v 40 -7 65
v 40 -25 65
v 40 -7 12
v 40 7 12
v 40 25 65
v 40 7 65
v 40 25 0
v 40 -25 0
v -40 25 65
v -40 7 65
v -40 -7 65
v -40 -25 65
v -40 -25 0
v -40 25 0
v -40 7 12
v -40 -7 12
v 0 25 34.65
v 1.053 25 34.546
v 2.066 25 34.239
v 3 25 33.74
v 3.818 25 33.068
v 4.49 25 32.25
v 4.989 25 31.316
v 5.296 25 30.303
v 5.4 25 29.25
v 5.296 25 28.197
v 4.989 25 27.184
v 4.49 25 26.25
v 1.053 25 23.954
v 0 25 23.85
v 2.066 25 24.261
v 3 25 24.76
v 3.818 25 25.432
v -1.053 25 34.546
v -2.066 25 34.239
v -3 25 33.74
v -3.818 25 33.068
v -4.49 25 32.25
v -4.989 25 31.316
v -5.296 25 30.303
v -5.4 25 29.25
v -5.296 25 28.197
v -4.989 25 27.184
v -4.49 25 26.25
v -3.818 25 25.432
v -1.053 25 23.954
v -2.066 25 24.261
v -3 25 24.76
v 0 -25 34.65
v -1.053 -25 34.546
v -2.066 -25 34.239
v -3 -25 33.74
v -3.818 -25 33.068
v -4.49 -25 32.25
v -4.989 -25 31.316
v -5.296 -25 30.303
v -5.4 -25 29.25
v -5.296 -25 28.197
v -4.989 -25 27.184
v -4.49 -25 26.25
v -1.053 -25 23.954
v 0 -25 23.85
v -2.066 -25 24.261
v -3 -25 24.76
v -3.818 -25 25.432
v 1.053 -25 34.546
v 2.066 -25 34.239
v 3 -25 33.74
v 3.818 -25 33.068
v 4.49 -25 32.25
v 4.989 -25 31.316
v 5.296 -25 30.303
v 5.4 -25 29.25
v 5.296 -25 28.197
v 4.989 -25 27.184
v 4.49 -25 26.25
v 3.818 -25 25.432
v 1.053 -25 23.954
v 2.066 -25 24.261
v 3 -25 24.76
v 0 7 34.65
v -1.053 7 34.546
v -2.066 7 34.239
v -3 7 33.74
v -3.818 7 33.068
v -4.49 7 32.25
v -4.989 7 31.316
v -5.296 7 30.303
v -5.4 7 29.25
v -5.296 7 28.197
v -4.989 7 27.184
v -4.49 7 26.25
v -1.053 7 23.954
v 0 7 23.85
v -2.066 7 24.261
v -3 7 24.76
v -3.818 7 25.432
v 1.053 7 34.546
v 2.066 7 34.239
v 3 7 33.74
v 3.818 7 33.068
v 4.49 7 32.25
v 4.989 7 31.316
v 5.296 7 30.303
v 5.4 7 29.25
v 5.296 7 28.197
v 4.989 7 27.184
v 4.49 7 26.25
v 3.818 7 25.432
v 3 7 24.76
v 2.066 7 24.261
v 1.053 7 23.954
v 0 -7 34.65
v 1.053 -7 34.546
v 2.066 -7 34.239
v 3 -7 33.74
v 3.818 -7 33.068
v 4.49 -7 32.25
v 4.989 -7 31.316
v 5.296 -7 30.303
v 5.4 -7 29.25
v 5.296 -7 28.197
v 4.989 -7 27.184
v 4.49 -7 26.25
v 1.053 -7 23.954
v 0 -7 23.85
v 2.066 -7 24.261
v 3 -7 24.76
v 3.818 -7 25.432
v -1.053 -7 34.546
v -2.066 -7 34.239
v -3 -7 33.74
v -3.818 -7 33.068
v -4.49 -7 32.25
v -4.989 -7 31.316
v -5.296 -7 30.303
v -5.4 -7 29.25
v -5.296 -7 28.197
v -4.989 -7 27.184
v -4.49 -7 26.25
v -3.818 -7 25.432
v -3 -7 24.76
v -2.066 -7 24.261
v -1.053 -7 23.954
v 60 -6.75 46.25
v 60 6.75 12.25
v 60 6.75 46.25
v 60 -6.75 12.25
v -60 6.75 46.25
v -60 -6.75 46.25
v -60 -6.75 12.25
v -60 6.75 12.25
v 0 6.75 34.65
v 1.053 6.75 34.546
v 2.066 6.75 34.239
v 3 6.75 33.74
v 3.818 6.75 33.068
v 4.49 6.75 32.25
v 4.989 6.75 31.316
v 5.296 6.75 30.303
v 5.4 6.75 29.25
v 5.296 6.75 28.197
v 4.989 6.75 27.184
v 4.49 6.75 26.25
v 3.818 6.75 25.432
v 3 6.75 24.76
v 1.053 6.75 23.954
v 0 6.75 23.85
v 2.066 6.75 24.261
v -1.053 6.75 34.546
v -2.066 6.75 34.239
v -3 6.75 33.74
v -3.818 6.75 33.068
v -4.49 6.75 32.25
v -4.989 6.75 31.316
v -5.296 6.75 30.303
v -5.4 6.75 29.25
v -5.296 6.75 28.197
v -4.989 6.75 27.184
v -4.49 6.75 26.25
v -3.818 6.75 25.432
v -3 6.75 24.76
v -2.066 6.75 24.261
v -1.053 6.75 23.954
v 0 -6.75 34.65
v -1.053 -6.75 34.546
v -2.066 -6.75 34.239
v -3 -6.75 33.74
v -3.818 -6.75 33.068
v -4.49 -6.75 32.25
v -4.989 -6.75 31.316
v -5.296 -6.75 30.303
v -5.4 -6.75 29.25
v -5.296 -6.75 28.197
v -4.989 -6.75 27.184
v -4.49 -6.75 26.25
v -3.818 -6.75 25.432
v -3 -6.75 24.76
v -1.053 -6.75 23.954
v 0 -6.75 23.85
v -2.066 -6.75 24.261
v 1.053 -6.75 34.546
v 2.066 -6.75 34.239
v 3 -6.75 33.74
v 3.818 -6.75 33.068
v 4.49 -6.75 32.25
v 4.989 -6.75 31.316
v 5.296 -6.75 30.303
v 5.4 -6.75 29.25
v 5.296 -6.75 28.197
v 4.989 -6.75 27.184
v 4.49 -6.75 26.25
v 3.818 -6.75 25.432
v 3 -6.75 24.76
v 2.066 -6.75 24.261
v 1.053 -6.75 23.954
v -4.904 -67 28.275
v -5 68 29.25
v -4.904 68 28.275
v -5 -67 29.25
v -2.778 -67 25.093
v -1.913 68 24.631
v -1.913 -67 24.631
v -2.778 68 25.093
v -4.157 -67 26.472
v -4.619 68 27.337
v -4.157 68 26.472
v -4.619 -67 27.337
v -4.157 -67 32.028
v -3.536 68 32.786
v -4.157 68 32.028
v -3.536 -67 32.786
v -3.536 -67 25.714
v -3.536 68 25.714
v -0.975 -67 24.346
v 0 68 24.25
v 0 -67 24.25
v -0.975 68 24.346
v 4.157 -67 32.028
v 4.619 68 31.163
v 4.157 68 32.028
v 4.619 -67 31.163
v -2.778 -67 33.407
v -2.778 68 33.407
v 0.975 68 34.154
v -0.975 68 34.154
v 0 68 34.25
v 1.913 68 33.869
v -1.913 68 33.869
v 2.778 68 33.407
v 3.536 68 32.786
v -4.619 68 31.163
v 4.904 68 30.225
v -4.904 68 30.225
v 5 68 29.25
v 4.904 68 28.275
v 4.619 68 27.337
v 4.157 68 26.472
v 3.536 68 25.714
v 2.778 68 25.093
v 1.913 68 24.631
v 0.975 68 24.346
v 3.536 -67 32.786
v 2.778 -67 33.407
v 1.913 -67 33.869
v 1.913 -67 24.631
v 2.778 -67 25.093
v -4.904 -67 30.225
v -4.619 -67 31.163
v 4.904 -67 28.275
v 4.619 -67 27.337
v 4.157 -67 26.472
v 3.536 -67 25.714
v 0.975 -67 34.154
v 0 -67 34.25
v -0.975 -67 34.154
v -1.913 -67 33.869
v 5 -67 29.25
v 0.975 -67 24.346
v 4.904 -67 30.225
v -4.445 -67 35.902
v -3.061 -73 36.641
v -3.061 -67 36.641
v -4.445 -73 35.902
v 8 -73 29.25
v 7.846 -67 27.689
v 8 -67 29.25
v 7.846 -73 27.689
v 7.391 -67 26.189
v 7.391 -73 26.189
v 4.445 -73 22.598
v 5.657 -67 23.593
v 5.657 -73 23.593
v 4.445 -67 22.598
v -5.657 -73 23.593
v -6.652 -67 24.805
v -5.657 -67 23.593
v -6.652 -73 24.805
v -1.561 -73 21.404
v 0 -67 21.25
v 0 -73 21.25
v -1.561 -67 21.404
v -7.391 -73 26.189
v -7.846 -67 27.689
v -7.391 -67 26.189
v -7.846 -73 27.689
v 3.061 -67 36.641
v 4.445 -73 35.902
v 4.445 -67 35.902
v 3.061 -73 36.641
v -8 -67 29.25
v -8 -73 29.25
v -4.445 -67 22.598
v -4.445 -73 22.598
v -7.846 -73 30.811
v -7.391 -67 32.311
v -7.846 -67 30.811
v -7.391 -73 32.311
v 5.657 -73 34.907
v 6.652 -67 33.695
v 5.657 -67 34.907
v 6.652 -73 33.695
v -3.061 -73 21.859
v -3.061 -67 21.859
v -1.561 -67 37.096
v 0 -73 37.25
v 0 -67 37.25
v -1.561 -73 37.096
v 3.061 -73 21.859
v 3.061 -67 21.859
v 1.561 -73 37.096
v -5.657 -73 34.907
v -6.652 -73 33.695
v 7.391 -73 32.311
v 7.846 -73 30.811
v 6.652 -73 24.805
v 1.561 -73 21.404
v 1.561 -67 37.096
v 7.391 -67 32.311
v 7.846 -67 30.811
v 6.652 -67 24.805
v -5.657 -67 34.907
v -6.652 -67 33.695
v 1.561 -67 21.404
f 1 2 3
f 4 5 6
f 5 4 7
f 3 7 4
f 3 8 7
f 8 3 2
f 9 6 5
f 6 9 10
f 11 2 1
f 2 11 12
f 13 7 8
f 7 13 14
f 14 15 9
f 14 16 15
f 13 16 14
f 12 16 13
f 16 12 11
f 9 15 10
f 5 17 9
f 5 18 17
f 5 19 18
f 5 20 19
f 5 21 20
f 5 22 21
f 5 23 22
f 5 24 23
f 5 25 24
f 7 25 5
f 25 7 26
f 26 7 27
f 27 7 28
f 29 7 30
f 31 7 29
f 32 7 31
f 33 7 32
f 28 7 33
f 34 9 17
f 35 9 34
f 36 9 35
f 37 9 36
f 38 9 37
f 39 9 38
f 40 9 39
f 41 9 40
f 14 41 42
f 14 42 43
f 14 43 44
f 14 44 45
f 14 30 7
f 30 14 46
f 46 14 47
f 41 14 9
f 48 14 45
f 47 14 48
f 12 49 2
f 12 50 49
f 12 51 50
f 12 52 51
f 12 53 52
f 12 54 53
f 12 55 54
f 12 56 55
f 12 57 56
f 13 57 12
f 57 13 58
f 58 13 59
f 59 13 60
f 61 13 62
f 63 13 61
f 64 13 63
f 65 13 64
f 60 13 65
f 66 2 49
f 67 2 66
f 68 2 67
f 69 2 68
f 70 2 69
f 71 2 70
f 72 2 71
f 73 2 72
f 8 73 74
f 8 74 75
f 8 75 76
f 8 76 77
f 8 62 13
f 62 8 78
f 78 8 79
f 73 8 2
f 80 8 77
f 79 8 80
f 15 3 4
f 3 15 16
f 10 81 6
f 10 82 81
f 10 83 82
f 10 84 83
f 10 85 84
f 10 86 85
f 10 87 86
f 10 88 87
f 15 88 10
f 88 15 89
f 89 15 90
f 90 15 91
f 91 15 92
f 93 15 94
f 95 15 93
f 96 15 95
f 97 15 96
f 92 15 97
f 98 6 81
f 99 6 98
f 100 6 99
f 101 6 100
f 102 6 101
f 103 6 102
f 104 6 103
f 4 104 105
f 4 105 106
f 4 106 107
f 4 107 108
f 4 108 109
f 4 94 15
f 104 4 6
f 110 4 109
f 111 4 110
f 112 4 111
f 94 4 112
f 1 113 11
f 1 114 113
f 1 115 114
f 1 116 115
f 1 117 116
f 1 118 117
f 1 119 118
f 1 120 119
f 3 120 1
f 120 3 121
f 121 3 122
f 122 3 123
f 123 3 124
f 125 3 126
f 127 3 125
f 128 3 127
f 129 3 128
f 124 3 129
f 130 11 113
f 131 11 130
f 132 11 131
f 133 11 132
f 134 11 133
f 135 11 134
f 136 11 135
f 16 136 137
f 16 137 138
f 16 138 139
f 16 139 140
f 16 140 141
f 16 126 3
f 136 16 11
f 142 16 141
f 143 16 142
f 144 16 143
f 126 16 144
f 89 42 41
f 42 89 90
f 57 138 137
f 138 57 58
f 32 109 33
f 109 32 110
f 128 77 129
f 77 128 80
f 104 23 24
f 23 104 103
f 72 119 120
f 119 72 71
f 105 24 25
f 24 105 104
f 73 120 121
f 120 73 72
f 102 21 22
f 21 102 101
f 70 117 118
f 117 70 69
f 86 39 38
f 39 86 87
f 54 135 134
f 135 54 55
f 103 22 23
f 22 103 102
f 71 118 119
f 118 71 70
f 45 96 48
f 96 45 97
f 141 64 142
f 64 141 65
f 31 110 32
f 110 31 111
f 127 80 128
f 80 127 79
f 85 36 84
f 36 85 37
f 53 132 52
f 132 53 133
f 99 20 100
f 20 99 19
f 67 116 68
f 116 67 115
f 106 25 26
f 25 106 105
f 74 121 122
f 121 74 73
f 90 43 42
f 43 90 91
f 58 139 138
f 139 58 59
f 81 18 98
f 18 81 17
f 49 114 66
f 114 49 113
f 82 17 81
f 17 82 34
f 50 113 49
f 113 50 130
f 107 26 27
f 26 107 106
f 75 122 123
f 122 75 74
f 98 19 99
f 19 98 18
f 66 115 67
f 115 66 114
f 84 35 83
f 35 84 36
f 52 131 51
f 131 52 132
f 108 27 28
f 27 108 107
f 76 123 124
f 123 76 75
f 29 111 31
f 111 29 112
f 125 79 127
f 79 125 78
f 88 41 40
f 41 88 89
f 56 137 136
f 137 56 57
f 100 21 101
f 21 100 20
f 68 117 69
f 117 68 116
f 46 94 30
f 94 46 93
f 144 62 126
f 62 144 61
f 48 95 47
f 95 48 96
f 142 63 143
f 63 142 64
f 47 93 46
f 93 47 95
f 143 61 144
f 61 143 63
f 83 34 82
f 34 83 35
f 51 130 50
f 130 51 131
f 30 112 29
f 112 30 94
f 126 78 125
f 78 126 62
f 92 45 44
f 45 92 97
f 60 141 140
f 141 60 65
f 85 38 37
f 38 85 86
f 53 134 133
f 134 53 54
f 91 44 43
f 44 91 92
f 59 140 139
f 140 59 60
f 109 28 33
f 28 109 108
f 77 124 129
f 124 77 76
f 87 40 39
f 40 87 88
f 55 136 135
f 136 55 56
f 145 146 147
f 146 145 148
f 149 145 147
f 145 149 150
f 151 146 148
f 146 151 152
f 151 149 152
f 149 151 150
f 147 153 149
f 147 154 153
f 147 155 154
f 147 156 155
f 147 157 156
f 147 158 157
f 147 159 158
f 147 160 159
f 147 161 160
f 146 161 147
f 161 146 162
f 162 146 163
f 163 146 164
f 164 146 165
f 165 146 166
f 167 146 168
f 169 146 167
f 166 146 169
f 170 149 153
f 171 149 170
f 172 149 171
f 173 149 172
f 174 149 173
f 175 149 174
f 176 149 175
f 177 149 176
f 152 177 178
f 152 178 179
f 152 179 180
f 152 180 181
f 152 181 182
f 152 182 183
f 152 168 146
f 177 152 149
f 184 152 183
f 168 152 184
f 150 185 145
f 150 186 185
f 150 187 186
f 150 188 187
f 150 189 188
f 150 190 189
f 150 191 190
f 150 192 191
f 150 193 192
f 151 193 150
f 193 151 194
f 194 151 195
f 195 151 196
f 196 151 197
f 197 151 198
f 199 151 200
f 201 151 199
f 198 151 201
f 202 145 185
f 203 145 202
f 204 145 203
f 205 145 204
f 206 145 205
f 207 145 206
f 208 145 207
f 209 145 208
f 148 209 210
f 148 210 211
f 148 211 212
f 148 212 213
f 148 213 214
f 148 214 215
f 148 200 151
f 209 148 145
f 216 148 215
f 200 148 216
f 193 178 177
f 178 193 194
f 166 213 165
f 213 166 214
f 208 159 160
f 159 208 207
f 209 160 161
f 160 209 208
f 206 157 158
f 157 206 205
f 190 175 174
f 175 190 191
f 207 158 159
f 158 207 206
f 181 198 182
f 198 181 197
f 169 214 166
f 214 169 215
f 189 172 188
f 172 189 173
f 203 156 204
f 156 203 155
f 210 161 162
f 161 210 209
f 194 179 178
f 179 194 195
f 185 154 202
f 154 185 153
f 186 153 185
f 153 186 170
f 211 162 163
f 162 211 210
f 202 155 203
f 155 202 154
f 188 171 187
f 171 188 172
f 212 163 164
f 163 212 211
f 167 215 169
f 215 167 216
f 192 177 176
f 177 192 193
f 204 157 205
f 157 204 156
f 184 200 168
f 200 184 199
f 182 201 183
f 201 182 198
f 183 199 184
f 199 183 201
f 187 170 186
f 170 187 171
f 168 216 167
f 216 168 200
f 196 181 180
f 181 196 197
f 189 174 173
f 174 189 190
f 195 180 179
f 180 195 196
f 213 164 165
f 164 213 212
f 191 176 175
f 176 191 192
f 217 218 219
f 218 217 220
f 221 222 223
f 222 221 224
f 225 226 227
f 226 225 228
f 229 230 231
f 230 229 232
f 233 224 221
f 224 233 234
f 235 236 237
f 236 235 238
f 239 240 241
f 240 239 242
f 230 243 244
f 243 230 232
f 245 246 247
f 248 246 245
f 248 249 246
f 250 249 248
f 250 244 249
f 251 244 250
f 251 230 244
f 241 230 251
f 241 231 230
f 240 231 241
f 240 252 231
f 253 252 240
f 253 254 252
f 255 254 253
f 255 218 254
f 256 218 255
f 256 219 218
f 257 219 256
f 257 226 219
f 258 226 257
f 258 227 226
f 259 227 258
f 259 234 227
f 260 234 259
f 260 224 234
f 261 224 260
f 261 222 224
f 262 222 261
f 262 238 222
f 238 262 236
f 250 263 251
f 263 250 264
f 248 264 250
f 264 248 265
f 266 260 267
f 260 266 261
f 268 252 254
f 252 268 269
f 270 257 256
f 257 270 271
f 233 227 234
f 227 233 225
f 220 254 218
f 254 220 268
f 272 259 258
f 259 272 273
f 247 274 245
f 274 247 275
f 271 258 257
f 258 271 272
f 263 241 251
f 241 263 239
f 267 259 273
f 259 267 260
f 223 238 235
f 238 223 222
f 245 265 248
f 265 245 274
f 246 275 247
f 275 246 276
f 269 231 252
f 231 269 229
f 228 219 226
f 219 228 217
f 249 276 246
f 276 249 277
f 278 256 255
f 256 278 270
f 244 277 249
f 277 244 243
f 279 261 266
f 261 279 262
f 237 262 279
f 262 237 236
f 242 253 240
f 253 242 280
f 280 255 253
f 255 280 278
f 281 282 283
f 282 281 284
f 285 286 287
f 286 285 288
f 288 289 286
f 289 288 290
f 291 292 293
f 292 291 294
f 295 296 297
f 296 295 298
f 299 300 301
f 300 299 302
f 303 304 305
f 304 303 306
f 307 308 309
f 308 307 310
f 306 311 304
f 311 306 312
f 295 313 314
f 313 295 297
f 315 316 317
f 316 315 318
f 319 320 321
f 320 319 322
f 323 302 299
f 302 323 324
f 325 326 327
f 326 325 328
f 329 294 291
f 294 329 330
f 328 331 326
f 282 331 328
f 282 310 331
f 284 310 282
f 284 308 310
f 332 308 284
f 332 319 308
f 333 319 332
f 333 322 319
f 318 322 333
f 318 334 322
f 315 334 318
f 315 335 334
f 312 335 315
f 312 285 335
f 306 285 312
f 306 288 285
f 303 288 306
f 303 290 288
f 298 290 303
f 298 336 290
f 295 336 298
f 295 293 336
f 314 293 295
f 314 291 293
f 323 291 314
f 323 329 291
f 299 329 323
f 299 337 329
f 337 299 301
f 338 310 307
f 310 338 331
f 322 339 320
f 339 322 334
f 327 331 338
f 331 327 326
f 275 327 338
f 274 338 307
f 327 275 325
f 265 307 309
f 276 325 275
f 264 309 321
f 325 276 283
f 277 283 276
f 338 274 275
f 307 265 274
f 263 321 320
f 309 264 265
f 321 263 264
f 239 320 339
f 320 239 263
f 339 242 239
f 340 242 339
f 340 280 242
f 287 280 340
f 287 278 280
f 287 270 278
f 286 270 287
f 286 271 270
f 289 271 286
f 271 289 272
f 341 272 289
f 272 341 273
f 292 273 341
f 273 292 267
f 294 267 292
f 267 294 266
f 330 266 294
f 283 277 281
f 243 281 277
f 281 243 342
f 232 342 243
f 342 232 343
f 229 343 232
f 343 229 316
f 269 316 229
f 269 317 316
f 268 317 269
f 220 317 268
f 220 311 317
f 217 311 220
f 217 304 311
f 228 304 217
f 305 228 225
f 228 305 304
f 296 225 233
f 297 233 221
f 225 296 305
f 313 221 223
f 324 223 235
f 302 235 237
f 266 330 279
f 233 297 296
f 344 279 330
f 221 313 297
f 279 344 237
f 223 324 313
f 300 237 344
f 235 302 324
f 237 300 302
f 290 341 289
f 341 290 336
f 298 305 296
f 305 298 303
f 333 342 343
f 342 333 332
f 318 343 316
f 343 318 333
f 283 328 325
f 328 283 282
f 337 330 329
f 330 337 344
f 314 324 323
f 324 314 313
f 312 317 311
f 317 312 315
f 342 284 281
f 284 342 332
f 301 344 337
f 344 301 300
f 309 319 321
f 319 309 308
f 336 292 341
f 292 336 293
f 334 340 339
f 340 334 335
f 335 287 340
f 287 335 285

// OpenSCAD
$fn = 32;

// ------------------------------------------------------------------------
// Clevis joint: 80 mm clevis, pin d10
// Every part is its own module, assembly() places them once.
// ------------------------------------------------------------------------

// --- part 1 ---
module clevis() {
  difference() {
    translate([-40, -25, 0]) cube([80, 50, 65]);
    translate([-41, -7, 12]) cube([82, 14, 54]);
    translate([0, 0, 29.25]) rotate([90, 0, 0]) cylinder(h = 52, d = 10.8, center = true);
  }
}

// --- part 2 ---
module eye() {
  difference() {
    translate([-60, -6.75, 0]) cube([120, 13.5, 34]);
    translate([0, 0, 17]) rotate([90, 0, 0]) cylinder(h = 15.5, d = 10.8, center = true);
  }
}

// --- part 3 ---
module pin() {
  rotate([0, 90, 0]) cylinder(h = 136, d = 10, center = true);
  translate([-73, 0, 0]) rotate([0, 90, 0]) cylinder(h = 6, d = 16);
}

// --- assembly ---
module assembly() {
  translate([0, 0, 0]) rotate([0, 0, 0]) clevis();
  translate([0, 0, 12.25]) rotate([0, 0, 0]) eye();
  translate([0, 0, 29.25]) rotate([0, 0, 90]) pin();
}

assembly();
